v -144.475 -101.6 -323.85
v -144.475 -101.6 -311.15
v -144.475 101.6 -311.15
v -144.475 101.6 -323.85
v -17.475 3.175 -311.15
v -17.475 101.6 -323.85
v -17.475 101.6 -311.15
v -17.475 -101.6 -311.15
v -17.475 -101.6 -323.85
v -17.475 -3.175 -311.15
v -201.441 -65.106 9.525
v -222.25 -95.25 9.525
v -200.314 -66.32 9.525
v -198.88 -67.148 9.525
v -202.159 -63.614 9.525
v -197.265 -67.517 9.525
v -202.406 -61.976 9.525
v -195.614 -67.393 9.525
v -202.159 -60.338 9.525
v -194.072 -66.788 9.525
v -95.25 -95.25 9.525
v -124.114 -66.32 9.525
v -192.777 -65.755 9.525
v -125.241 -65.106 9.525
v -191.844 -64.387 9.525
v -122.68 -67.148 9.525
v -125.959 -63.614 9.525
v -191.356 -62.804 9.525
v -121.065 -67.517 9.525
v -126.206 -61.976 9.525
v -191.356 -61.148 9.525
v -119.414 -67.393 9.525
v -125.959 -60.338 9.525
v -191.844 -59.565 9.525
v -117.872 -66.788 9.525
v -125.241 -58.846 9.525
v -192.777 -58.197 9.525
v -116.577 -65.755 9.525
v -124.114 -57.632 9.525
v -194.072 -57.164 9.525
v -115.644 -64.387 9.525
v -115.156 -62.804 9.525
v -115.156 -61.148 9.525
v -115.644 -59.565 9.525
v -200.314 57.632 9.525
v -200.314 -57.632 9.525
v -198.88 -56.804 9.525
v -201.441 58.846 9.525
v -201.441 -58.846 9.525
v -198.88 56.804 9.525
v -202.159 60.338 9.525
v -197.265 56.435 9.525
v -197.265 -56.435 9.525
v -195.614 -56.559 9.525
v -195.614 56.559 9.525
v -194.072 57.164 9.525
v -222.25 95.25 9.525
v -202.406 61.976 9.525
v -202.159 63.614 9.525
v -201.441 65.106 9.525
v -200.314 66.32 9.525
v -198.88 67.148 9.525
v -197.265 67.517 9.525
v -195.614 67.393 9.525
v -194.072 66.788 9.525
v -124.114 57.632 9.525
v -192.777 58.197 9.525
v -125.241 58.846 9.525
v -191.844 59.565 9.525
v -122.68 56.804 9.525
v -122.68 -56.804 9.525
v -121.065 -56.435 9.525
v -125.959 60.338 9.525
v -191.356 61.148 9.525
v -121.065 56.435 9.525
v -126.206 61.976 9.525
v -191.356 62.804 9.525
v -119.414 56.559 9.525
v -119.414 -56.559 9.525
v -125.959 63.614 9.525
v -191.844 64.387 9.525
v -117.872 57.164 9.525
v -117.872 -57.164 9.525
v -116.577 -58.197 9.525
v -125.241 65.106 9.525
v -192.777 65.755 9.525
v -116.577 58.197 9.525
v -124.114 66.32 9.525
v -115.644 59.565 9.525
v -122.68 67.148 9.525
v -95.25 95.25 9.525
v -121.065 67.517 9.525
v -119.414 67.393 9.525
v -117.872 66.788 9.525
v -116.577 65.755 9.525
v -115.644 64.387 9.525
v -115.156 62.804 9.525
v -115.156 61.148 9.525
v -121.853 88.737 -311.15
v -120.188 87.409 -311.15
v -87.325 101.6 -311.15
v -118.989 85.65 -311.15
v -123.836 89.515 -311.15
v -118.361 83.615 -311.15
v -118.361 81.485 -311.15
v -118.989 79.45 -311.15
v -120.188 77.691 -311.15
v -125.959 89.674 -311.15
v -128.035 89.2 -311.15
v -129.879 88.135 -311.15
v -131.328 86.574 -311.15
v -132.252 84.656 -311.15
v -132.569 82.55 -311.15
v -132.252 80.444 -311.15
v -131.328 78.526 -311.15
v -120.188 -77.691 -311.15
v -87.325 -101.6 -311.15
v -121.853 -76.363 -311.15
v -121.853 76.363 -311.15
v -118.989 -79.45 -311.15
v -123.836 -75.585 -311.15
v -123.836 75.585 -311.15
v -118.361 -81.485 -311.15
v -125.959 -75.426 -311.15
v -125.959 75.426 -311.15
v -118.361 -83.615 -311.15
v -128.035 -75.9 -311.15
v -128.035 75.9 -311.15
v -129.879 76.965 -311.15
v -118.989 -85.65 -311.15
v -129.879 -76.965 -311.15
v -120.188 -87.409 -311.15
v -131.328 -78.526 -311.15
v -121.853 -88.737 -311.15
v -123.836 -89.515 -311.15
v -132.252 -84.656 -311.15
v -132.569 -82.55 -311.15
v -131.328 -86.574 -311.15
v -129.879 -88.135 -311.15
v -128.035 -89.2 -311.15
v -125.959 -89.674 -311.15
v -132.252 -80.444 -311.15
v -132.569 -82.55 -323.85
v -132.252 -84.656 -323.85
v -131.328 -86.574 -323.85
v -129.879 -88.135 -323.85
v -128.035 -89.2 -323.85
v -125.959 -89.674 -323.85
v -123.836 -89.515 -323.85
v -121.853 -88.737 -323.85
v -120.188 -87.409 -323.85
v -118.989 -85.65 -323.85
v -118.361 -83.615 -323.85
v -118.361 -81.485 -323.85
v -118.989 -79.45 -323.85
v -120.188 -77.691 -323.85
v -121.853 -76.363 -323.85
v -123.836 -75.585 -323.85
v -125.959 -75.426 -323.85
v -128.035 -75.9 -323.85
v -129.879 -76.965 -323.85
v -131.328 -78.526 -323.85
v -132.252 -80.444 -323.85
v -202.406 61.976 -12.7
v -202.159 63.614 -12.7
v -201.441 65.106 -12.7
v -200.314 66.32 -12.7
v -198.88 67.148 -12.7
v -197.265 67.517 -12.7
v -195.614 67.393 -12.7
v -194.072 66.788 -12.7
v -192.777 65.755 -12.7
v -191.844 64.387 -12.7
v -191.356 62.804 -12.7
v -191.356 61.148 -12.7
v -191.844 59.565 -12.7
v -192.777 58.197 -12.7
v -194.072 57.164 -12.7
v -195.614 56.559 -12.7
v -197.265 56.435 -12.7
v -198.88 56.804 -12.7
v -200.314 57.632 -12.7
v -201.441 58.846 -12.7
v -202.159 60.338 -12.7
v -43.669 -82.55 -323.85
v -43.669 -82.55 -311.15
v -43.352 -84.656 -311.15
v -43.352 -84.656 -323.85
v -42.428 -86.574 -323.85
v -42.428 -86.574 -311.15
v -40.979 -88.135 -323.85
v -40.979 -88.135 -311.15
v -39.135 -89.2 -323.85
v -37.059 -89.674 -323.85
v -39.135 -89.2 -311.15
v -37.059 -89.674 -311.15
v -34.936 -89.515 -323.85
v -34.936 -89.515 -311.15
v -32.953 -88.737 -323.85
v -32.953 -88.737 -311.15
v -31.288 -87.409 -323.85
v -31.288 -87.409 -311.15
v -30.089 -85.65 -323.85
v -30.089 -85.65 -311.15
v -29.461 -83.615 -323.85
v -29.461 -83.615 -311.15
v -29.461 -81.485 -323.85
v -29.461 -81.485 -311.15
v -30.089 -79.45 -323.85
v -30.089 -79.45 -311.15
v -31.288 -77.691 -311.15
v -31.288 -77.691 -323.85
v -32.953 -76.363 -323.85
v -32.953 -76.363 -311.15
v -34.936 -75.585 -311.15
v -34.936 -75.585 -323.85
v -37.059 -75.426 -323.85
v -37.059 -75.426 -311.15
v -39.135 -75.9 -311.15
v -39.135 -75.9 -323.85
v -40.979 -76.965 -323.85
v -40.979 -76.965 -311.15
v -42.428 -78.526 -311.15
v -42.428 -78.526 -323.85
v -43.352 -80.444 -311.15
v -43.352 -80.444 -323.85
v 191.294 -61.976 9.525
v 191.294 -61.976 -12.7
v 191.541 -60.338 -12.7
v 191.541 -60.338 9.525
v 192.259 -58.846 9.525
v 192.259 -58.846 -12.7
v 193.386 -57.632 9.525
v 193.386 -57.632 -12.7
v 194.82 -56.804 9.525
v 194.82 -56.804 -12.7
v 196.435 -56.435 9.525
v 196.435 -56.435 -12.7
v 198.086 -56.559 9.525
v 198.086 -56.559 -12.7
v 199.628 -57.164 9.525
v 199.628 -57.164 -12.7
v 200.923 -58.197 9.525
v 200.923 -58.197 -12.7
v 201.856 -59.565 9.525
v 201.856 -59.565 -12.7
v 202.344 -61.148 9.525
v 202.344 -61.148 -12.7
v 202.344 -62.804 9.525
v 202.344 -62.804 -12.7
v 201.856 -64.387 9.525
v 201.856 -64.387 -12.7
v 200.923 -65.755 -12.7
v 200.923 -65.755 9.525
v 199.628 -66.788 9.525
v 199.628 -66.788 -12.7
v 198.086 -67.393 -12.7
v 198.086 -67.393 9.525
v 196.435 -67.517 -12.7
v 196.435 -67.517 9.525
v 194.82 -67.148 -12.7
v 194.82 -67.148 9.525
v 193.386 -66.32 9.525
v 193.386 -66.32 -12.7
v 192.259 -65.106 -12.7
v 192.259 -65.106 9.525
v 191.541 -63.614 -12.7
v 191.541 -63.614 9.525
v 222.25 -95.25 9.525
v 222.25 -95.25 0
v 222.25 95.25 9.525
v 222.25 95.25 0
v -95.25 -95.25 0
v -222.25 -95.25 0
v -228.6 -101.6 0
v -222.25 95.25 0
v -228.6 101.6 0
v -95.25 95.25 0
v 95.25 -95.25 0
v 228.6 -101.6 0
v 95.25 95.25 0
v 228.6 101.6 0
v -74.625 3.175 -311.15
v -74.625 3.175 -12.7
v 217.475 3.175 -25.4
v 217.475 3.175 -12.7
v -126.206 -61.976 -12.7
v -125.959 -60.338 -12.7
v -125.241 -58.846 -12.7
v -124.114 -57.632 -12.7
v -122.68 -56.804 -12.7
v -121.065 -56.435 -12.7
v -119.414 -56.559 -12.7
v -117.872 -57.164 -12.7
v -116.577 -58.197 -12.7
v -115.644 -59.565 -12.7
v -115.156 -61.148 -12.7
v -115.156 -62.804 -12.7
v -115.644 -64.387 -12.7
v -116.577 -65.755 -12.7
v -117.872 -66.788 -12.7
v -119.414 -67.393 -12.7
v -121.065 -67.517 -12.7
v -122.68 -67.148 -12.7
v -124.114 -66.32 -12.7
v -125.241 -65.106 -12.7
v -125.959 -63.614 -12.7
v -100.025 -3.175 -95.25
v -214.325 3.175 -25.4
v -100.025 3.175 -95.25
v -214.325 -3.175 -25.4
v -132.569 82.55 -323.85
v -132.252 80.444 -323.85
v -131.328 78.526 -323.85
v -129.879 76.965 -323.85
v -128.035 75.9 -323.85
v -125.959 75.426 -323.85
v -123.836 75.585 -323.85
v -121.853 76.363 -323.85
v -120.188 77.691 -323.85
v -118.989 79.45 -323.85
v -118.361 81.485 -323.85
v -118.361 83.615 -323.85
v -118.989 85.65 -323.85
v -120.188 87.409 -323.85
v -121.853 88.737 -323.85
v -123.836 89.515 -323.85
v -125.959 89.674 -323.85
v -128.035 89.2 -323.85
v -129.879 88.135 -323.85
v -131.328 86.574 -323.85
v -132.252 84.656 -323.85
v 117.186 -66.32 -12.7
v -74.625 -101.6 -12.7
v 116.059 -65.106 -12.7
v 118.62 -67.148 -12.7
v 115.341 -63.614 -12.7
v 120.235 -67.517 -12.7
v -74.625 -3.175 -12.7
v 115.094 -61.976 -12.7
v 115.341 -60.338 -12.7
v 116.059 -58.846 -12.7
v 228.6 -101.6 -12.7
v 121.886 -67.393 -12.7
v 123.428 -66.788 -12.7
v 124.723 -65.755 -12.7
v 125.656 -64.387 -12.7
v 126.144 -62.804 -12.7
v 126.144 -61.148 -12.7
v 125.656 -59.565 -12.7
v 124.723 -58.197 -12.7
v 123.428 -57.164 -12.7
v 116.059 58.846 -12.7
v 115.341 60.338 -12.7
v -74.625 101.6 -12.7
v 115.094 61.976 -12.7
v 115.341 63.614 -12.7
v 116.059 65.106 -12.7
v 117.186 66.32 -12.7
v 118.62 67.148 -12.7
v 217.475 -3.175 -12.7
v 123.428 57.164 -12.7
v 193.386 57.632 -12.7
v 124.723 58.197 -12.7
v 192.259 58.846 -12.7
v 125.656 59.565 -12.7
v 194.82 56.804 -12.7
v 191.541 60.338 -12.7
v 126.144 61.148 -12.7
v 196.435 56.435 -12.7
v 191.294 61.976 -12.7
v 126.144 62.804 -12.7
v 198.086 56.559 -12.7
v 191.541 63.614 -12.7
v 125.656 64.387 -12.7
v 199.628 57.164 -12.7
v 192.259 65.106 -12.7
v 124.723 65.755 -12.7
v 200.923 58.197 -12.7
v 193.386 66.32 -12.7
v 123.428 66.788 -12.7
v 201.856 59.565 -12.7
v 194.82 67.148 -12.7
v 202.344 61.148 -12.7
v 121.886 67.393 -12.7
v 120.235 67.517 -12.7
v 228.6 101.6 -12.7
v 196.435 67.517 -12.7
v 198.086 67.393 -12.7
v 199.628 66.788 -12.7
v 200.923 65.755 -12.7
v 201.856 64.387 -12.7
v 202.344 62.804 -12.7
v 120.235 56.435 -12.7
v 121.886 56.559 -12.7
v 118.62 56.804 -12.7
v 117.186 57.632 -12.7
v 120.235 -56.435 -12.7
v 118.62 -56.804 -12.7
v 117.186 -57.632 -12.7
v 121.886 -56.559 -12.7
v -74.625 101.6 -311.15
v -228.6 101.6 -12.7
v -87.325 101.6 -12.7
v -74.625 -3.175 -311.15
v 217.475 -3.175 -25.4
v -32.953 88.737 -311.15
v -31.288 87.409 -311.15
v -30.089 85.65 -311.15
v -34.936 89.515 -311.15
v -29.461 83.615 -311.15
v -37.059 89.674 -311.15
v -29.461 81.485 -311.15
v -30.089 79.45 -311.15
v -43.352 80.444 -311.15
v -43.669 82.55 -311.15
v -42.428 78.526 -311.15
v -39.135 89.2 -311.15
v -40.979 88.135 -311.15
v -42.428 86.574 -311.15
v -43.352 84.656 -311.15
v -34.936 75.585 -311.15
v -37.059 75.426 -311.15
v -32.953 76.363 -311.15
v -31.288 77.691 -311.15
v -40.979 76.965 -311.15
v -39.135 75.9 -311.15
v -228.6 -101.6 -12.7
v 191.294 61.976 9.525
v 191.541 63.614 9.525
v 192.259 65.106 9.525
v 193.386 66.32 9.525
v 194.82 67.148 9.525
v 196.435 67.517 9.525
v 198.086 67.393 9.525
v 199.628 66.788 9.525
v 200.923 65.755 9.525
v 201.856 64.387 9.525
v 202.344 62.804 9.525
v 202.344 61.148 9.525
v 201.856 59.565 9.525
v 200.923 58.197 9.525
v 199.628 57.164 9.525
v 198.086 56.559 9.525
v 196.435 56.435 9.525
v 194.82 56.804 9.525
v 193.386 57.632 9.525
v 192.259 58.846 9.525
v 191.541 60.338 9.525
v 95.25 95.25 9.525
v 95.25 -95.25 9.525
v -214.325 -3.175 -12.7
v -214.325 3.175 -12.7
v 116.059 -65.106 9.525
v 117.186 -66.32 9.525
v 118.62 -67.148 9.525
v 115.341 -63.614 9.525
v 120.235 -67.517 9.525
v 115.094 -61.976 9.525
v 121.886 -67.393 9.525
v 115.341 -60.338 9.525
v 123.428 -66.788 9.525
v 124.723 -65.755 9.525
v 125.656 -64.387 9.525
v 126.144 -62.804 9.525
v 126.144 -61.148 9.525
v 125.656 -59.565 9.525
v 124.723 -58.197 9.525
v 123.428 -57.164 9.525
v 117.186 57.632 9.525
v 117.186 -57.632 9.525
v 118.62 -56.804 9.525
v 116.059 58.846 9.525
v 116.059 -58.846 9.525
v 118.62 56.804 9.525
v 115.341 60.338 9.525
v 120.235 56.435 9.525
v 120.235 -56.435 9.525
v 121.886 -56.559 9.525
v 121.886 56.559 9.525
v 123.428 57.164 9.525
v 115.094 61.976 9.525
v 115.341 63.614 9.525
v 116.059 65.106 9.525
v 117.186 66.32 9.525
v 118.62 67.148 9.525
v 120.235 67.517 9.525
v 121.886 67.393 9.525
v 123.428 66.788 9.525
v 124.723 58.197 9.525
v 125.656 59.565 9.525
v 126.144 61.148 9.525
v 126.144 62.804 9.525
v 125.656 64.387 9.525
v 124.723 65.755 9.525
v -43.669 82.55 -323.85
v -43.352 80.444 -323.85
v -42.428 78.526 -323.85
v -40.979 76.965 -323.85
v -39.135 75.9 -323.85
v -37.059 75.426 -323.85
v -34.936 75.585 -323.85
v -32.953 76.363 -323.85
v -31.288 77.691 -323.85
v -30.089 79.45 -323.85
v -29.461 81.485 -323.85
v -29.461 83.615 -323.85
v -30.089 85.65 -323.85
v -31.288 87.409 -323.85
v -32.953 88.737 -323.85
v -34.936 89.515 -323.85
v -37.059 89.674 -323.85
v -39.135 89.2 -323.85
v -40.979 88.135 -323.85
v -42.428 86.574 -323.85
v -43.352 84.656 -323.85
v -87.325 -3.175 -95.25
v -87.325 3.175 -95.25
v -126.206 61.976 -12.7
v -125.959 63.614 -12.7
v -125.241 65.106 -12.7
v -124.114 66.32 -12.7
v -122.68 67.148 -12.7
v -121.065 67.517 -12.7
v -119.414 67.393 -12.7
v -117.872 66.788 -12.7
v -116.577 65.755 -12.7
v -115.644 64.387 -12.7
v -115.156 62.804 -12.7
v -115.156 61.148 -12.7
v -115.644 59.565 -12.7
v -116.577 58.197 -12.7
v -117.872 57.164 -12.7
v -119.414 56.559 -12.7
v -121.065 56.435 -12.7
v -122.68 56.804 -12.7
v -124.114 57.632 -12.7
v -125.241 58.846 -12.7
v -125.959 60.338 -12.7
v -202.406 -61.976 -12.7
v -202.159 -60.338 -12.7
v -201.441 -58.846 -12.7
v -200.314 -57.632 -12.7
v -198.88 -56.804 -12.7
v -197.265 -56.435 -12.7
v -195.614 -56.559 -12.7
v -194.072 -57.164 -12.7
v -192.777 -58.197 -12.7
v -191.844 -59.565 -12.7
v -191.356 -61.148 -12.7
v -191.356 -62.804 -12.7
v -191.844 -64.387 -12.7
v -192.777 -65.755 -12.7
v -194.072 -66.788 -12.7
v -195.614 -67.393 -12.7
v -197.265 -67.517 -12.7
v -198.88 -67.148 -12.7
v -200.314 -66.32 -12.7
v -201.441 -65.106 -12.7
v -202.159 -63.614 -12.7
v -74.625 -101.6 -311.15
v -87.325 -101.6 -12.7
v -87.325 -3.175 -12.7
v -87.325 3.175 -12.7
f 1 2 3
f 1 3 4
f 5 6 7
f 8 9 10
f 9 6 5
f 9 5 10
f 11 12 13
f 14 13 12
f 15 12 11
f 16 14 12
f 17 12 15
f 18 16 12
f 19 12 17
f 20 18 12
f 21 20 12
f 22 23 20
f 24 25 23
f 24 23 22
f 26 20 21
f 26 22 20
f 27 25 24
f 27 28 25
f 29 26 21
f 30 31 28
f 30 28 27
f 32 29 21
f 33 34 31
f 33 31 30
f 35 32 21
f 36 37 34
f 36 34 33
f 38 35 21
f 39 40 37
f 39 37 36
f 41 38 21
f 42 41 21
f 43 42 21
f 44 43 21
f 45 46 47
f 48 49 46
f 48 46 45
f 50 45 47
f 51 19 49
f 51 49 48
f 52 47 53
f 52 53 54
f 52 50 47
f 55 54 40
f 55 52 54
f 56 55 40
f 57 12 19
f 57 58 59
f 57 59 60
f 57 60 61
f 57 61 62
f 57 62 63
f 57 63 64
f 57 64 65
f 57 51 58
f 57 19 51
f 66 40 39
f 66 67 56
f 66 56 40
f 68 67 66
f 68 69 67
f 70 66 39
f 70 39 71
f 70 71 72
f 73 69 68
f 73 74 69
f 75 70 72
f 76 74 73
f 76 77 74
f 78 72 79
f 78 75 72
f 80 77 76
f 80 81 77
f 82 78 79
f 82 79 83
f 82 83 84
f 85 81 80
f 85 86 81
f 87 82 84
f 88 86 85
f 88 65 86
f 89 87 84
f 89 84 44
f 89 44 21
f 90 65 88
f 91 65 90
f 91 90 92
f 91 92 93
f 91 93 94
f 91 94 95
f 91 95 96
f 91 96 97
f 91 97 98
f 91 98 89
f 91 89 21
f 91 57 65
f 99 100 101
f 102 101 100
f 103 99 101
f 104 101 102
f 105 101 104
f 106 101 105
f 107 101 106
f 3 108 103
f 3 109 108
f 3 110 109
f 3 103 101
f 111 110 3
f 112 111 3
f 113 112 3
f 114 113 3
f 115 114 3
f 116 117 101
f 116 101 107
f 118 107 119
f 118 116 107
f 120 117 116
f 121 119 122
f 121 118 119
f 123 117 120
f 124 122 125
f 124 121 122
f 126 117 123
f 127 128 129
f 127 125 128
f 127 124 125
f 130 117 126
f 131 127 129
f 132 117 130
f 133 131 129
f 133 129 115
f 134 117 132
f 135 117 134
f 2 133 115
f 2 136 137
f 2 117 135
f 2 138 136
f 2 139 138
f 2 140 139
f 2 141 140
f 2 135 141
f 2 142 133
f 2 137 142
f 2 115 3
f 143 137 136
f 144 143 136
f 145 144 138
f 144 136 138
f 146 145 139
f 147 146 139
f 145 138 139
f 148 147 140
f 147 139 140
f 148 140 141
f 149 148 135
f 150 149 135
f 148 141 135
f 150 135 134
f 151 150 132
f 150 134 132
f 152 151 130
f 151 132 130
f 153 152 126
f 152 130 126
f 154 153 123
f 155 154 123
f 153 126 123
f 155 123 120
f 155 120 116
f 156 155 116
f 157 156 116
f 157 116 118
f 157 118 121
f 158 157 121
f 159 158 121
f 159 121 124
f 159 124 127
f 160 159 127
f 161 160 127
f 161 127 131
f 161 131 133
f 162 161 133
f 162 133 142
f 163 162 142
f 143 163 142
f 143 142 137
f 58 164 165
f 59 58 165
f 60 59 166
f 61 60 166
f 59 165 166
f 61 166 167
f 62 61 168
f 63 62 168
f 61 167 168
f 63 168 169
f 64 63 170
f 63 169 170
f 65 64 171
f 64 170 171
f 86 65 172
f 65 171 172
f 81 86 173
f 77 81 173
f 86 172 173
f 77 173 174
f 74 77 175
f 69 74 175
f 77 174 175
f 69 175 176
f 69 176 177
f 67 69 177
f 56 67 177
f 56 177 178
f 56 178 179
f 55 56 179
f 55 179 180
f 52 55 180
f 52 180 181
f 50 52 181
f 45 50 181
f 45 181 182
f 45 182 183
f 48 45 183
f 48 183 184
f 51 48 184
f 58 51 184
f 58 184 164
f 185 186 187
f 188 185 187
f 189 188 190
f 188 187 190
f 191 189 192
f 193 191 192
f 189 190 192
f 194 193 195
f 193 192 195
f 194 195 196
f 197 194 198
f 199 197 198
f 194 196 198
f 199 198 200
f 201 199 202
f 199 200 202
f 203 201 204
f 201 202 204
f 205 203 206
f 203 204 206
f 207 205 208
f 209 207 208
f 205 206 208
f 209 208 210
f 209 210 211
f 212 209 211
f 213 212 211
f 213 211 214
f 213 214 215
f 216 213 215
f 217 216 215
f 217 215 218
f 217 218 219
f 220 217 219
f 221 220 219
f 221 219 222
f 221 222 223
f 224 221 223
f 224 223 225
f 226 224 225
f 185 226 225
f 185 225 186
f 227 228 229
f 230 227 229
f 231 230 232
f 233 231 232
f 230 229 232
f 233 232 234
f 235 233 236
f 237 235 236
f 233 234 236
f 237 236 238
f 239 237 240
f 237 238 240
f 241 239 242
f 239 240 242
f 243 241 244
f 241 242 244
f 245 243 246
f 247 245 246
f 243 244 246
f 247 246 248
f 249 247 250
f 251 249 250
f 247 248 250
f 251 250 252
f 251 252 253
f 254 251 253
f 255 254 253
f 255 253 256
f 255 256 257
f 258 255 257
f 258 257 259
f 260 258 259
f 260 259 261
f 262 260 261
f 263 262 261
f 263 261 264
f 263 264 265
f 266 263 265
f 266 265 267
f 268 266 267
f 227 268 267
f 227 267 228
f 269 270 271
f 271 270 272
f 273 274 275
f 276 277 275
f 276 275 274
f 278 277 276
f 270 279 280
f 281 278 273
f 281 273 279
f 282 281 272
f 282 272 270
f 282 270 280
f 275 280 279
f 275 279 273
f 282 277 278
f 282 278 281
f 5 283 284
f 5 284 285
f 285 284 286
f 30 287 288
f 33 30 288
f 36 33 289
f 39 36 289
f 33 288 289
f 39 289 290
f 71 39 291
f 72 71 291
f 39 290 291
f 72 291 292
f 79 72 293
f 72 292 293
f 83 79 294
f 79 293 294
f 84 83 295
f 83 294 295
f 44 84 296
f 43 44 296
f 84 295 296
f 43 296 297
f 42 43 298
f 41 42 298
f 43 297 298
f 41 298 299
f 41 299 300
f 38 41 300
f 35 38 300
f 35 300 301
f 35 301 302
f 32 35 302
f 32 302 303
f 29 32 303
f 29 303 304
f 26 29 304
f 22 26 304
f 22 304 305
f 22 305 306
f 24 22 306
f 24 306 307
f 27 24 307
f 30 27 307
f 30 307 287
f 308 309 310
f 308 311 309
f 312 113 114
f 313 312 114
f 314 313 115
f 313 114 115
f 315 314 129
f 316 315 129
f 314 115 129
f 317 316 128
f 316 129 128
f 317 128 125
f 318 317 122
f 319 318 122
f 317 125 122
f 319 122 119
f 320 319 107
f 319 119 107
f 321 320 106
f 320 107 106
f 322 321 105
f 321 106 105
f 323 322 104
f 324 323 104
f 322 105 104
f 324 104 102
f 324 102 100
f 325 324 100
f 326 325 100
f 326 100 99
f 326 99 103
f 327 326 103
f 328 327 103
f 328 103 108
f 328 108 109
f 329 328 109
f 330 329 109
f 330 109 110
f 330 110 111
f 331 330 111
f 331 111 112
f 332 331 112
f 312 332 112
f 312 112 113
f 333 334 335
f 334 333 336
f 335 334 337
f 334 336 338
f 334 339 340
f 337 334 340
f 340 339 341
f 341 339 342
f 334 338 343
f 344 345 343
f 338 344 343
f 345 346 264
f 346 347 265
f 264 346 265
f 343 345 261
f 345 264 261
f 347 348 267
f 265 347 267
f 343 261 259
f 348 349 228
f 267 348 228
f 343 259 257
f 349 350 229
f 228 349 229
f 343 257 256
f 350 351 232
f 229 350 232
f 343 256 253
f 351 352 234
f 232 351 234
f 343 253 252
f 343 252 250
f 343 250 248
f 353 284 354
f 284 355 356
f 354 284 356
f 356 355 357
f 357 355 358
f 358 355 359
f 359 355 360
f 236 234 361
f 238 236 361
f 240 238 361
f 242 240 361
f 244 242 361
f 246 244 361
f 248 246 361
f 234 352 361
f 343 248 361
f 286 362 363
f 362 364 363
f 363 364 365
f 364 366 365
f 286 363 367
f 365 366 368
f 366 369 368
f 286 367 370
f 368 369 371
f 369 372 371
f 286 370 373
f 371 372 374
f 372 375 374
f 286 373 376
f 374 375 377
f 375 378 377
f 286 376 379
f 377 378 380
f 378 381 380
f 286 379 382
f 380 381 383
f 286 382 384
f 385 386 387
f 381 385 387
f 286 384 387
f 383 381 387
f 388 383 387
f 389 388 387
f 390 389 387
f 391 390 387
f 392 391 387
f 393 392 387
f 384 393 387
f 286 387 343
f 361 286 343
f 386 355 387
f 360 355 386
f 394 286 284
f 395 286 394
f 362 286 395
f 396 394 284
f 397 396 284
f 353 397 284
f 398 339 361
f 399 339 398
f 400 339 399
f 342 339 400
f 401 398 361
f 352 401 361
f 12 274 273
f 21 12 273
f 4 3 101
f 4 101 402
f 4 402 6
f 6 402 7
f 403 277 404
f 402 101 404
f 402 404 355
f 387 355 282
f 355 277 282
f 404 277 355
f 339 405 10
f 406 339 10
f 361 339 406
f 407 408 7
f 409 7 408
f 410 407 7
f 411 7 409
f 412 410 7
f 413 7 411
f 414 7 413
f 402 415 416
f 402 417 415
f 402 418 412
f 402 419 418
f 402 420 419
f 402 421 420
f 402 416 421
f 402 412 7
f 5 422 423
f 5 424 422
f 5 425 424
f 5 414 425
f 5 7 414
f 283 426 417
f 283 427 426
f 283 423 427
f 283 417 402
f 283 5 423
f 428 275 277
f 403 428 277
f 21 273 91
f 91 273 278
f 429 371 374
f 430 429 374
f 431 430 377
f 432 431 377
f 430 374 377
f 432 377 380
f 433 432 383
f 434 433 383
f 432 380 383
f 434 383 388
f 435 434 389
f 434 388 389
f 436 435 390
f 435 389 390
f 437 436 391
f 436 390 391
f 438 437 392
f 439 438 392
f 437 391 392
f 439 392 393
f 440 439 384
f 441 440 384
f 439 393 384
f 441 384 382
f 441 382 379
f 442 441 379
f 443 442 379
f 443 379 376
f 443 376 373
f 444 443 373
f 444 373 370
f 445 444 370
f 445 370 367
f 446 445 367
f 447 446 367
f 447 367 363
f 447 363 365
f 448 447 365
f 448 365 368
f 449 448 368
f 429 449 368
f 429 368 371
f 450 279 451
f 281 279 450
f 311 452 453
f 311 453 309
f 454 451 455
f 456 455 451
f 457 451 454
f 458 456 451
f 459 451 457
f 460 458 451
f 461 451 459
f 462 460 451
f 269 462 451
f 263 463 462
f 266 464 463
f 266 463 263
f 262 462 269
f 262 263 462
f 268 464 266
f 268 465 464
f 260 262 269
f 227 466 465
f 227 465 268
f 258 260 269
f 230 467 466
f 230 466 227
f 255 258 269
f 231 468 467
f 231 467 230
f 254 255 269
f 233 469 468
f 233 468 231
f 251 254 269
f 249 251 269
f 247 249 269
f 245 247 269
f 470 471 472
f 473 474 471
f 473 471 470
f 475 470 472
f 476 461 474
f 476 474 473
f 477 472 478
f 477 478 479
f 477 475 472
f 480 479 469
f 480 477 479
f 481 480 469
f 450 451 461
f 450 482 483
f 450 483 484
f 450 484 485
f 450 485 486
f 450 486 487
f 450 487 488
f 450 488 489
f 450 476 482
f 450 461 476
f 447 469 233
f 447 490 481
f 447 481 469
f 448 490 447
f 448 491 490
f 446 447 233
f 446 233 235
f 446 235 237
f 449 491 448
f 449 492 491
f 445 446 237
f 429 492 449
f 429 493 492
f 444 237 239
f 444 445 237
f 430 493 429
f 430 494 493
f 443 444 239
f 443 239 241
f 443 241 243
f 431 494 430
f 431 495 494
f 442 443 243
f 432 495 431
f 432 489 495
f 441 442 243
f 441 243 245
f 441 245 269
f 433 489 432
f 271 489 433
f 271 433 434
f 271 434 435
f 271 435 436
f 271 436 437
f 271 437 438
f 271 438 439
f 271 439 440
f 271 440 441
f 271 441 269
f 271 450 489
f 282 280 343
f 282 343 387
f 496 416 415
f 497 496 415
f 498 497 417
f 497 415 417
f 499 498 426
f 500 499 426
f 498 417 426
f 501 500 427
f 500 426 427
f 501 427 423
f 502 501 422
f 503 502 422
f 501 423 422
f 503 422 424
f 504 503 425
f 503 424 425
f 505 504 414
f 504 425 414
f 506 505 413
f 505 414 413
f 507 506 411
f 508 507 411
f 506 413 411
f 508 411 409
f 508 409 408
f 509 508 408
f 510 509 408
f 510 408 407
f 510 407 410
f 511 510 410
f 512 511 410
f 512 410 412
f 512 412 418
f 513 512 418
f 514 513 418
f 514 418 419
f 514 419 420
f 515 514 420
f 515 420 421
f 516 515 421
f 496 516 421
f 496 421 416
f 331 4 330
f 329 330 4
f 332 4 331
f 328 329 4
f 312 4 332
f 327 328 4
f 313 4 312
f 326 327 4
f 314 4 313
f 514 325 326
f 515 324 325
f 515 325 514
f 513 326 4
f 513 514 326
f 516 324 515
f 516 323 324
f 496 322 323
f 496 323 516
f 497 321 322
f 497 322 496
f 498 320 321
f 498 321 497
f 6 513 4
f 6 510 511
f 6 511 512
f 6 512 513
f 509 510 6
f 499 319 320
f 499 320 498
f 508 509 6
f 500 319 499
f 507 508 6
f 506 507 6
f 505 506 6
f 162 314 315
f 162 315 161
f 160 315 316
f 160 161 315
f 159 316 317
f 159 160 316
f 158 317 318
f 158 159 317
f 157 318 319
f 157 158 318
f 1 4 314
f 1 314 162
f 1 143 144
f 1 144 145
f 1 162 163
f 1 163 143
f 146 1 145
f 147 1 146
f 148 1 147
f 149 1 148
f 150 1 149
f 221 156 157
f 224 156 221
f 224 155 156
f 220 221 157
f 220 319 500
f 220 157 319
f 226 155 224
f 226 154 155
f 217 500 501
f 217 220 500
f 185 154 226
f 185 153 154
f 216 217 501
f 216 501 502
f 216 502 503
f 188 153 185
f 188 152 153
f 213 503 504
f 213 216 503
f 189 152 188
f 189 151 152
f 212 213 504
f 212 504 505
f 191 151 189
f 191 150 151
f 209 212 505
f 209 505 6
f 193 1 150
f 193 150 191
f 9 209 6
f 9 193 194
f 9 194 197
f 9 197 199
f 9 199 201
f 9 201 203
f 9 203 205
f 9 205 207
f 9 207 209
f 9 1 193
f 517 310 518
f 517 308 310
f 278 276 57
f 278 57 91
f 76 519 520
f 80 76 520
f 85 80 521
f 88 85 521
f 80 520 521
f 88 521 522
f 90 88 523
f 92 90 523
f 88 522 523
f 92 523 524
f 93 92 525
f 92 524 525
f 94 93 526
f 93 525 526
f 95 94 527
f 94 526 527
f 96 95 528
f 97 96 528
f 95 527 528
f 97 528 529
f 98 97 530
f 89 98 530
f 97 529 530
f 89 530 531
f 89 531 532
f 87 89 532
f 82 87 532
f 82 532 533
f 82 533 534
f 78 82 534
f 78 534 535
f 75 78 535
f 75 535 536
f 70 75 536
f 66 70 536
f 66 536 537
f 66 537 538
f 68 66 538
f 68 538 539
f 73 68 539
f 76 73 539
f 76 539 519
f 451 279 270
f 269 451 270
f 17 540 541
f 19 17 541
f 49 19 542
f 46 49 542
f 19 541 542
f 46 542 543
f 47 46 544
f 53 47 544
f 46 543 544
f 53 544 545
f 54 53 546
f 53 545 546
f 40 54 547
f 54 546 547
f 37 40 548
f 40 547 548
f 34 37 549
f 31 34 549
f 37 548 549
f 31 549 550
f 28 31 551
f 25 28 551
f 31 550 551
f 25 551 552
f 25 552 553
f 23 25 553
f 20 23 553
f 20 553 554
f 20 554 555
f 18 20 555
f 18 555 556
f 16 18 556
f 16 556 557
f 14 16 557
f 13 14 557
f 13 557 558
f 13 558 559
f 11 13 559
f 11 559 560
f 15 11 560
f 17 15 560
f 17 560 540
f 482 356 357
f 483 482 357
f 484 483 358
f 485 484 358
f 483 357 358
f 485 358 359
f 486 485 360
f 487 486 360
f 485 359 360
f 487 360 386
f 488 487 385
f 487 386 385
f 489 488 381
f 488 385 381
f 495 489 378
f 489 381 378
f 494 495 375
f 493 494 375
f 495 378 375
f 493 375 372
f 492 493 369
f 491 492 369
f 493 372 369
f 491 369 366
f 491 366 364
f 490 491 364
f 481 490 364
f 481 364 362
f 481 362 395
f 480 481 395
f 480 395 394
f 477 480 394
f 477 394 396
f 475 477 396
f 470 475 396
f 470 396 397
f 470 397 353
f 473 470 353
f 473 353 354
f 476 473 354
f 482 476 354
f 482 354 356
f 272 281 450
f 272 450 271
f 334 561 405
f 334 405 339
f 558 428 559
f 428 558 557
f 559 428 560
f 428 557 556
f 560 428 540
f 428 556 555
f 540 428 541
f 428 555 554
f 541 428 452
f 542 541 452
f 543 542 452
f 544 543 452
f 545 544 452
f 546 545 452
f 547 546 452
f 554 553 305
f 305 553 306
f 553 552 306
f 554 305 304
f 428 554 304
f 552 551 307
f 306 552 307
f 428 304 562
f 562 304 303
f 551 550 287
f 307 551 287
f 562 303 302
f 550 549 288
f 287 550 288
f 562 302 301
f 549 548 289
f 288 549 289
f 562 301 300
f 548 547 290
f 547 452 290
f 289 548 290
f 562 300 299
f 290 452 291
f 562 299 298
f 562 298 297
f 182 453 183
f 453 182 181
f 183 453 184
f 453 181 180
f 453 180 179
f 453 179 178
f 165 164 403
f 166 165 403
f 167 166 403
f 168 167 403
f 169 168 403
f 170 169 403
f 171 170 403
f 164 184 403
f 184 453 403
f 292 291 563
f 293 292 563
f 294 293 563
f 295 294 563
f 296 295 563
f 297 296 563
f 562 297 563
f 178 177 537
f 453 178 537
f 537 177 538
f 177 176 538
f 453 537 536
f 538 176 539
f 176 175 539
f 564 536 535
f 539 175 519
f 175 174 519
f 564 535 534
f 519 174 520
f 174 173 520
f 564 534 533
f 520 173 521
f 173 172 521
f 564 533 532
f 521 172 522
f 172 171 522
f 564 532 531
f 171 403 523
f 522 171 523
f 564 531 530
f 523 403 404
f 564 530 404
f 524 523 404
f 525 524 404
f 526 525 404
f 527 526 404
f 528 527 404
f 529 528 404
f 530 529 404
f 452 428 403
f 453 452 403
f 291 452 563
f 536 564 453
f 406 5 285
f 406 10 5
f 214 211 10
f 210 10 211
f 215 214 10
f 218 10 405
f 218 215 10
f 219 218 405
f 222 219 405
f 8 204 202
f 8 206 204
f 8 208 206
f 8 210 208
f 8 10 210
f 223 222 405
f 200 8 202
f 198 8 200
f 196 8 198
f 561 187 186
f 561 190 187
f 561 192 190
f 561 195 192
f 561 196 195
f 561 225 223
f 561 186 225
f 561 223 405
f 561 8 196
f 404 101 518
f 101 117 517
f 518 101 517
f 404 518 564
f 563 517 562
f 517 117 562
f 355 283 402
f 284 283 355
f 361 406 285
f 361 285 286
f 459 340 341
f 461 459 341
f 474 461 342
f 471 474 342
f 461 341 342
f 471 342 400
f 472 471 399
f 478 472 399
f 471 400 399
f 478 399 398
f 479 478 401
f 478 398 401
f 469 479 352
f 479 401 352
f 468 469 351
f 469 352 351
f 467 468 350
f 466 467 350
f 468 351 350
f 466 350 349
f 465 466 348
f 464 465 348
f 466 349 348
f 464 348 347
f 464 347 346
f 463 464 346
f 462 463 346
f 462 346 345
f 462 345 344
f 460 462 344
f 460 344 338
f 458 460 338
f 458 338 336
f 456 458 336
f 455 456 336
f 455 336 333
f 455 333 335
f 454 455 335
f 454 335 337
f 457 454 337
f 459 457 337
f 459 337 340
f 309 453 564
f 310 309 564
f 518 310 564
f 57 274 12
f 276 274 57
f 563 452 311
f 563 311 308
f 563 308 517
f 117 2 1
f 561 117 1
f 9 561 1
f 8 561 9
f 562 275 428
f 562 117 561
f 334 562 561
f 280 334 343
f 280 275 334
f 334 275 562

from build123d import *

# Parameters (mm, degrees)
F0_W      = 457.2
F0_H      = 203.2
F1_DEPTH  = 12.7
F2_W      = 127
F2_H      = 190.5
F3_DEPTH  = 9.525
F5_D      = 11.1125
F7_DEPTH  = 3.175
F8_W      = 234.95
F8_H      = 12.7
F8_W_2    = 57.15
F8_H_2    = 285.75
F9_DEPTH  = 3.175
F10_W     = 12.7
F10_H     = 298.45
F11_DEPTH = 101.6
F13_DEPTH = 101.6
F15_D     = 14.2875
F15_DEPTH = 38.1


with BuildPart() as f1:
    # F0 (on Top) → F1 (new body)
    with BuildSketch(Plane.XY):
        Rectangle(F0_W, F0_H)
    extrude(amount=-F1_DEPTH)

    # F2 (on face) → F3 (join)
    with BuildSketch(Plane.XY):
        with Locations((158.75, 0)):
            Rectangle(F2_W, F2_H)
        with Locations((-158.75, 0)):
            Rectangle(F2_W, F2_H)
    extrude(amount=F3_DEPTH)

    # F5 (through all)
    with Locations(Plane.XY.offset(9.525)):
        with Locations((-196.85, 61.976), (-120.65, 61.976), (-196.85, -61.976), (-120.65, -61.976), (120.65, 61.976), (196.85, 61.976), (120.65, -61.976), (196.85, -61.976)):
            Hole(F5_D / 2)

    # F6 (on Front) → F7 (join, symmetric)
    with BuildSketch(Plane.XZ):
        Polygon((-87.3252, -95.25), (-87.3252, -12.7), (-214.3252, -12.7), (-214.3252, -25.4), (-100.0252, -95.25), align=None)
    extrude(amount=F7_DEPTH, both=True)

    # F8 (on Front) → F9 (join, symmetric)
    with BuildSketch(Plane.XZ):
        with Locations((99.9998, -19.05)):
            Rectangle(F8_W, F8_H)
        Polygon((-17.4752, -311.15), (217.4748, -25.4), (-17.4752, -25.4), align=None)
        with Locations((-46.0502, -19.05)):
            Rectangle(F8_W_2, F8_H)
        with Locations((-46.0502, -168.275)):
            Rectangle(F8_W_2, F8_H_2)
    extrude(amount=F9_DEPTH, both=True)

    # F10 (on Front) → F11 (join, symmetric)
    with BuildSketch(Plane.XZ):
        with Locations((-80.9752, -161.925)):
            Rectangle(F10_W, F10_H)
    extrude(amount=F11_DEPTH, both=True)

    # F12 (on Front) → F13 (join, symmetric)
    with BuildSketch(Plane.XZ):
        Polygon((-17.4752, -311.15), (-74.6252, -311.15), (-144.4752, -311.15), (-144.4752, -323.85), (-17.4752, -323.85), align=None)
    extrude(amount=F13_DEPTH, both=True)

    # F15
    with Locations(Plane(origin=(0, 0, -323.85), x_dir=(1, 0, 0), z_dir=(0, 0, -1))):
        with Locations((-125.4252, 82.55), (-125.4252, -82.55), (-36.5252, 82.55), (-36.5252, -82.55)):
            Hole(F15_D / 2, depth=F15_DEPTH)


solid = f1.part
